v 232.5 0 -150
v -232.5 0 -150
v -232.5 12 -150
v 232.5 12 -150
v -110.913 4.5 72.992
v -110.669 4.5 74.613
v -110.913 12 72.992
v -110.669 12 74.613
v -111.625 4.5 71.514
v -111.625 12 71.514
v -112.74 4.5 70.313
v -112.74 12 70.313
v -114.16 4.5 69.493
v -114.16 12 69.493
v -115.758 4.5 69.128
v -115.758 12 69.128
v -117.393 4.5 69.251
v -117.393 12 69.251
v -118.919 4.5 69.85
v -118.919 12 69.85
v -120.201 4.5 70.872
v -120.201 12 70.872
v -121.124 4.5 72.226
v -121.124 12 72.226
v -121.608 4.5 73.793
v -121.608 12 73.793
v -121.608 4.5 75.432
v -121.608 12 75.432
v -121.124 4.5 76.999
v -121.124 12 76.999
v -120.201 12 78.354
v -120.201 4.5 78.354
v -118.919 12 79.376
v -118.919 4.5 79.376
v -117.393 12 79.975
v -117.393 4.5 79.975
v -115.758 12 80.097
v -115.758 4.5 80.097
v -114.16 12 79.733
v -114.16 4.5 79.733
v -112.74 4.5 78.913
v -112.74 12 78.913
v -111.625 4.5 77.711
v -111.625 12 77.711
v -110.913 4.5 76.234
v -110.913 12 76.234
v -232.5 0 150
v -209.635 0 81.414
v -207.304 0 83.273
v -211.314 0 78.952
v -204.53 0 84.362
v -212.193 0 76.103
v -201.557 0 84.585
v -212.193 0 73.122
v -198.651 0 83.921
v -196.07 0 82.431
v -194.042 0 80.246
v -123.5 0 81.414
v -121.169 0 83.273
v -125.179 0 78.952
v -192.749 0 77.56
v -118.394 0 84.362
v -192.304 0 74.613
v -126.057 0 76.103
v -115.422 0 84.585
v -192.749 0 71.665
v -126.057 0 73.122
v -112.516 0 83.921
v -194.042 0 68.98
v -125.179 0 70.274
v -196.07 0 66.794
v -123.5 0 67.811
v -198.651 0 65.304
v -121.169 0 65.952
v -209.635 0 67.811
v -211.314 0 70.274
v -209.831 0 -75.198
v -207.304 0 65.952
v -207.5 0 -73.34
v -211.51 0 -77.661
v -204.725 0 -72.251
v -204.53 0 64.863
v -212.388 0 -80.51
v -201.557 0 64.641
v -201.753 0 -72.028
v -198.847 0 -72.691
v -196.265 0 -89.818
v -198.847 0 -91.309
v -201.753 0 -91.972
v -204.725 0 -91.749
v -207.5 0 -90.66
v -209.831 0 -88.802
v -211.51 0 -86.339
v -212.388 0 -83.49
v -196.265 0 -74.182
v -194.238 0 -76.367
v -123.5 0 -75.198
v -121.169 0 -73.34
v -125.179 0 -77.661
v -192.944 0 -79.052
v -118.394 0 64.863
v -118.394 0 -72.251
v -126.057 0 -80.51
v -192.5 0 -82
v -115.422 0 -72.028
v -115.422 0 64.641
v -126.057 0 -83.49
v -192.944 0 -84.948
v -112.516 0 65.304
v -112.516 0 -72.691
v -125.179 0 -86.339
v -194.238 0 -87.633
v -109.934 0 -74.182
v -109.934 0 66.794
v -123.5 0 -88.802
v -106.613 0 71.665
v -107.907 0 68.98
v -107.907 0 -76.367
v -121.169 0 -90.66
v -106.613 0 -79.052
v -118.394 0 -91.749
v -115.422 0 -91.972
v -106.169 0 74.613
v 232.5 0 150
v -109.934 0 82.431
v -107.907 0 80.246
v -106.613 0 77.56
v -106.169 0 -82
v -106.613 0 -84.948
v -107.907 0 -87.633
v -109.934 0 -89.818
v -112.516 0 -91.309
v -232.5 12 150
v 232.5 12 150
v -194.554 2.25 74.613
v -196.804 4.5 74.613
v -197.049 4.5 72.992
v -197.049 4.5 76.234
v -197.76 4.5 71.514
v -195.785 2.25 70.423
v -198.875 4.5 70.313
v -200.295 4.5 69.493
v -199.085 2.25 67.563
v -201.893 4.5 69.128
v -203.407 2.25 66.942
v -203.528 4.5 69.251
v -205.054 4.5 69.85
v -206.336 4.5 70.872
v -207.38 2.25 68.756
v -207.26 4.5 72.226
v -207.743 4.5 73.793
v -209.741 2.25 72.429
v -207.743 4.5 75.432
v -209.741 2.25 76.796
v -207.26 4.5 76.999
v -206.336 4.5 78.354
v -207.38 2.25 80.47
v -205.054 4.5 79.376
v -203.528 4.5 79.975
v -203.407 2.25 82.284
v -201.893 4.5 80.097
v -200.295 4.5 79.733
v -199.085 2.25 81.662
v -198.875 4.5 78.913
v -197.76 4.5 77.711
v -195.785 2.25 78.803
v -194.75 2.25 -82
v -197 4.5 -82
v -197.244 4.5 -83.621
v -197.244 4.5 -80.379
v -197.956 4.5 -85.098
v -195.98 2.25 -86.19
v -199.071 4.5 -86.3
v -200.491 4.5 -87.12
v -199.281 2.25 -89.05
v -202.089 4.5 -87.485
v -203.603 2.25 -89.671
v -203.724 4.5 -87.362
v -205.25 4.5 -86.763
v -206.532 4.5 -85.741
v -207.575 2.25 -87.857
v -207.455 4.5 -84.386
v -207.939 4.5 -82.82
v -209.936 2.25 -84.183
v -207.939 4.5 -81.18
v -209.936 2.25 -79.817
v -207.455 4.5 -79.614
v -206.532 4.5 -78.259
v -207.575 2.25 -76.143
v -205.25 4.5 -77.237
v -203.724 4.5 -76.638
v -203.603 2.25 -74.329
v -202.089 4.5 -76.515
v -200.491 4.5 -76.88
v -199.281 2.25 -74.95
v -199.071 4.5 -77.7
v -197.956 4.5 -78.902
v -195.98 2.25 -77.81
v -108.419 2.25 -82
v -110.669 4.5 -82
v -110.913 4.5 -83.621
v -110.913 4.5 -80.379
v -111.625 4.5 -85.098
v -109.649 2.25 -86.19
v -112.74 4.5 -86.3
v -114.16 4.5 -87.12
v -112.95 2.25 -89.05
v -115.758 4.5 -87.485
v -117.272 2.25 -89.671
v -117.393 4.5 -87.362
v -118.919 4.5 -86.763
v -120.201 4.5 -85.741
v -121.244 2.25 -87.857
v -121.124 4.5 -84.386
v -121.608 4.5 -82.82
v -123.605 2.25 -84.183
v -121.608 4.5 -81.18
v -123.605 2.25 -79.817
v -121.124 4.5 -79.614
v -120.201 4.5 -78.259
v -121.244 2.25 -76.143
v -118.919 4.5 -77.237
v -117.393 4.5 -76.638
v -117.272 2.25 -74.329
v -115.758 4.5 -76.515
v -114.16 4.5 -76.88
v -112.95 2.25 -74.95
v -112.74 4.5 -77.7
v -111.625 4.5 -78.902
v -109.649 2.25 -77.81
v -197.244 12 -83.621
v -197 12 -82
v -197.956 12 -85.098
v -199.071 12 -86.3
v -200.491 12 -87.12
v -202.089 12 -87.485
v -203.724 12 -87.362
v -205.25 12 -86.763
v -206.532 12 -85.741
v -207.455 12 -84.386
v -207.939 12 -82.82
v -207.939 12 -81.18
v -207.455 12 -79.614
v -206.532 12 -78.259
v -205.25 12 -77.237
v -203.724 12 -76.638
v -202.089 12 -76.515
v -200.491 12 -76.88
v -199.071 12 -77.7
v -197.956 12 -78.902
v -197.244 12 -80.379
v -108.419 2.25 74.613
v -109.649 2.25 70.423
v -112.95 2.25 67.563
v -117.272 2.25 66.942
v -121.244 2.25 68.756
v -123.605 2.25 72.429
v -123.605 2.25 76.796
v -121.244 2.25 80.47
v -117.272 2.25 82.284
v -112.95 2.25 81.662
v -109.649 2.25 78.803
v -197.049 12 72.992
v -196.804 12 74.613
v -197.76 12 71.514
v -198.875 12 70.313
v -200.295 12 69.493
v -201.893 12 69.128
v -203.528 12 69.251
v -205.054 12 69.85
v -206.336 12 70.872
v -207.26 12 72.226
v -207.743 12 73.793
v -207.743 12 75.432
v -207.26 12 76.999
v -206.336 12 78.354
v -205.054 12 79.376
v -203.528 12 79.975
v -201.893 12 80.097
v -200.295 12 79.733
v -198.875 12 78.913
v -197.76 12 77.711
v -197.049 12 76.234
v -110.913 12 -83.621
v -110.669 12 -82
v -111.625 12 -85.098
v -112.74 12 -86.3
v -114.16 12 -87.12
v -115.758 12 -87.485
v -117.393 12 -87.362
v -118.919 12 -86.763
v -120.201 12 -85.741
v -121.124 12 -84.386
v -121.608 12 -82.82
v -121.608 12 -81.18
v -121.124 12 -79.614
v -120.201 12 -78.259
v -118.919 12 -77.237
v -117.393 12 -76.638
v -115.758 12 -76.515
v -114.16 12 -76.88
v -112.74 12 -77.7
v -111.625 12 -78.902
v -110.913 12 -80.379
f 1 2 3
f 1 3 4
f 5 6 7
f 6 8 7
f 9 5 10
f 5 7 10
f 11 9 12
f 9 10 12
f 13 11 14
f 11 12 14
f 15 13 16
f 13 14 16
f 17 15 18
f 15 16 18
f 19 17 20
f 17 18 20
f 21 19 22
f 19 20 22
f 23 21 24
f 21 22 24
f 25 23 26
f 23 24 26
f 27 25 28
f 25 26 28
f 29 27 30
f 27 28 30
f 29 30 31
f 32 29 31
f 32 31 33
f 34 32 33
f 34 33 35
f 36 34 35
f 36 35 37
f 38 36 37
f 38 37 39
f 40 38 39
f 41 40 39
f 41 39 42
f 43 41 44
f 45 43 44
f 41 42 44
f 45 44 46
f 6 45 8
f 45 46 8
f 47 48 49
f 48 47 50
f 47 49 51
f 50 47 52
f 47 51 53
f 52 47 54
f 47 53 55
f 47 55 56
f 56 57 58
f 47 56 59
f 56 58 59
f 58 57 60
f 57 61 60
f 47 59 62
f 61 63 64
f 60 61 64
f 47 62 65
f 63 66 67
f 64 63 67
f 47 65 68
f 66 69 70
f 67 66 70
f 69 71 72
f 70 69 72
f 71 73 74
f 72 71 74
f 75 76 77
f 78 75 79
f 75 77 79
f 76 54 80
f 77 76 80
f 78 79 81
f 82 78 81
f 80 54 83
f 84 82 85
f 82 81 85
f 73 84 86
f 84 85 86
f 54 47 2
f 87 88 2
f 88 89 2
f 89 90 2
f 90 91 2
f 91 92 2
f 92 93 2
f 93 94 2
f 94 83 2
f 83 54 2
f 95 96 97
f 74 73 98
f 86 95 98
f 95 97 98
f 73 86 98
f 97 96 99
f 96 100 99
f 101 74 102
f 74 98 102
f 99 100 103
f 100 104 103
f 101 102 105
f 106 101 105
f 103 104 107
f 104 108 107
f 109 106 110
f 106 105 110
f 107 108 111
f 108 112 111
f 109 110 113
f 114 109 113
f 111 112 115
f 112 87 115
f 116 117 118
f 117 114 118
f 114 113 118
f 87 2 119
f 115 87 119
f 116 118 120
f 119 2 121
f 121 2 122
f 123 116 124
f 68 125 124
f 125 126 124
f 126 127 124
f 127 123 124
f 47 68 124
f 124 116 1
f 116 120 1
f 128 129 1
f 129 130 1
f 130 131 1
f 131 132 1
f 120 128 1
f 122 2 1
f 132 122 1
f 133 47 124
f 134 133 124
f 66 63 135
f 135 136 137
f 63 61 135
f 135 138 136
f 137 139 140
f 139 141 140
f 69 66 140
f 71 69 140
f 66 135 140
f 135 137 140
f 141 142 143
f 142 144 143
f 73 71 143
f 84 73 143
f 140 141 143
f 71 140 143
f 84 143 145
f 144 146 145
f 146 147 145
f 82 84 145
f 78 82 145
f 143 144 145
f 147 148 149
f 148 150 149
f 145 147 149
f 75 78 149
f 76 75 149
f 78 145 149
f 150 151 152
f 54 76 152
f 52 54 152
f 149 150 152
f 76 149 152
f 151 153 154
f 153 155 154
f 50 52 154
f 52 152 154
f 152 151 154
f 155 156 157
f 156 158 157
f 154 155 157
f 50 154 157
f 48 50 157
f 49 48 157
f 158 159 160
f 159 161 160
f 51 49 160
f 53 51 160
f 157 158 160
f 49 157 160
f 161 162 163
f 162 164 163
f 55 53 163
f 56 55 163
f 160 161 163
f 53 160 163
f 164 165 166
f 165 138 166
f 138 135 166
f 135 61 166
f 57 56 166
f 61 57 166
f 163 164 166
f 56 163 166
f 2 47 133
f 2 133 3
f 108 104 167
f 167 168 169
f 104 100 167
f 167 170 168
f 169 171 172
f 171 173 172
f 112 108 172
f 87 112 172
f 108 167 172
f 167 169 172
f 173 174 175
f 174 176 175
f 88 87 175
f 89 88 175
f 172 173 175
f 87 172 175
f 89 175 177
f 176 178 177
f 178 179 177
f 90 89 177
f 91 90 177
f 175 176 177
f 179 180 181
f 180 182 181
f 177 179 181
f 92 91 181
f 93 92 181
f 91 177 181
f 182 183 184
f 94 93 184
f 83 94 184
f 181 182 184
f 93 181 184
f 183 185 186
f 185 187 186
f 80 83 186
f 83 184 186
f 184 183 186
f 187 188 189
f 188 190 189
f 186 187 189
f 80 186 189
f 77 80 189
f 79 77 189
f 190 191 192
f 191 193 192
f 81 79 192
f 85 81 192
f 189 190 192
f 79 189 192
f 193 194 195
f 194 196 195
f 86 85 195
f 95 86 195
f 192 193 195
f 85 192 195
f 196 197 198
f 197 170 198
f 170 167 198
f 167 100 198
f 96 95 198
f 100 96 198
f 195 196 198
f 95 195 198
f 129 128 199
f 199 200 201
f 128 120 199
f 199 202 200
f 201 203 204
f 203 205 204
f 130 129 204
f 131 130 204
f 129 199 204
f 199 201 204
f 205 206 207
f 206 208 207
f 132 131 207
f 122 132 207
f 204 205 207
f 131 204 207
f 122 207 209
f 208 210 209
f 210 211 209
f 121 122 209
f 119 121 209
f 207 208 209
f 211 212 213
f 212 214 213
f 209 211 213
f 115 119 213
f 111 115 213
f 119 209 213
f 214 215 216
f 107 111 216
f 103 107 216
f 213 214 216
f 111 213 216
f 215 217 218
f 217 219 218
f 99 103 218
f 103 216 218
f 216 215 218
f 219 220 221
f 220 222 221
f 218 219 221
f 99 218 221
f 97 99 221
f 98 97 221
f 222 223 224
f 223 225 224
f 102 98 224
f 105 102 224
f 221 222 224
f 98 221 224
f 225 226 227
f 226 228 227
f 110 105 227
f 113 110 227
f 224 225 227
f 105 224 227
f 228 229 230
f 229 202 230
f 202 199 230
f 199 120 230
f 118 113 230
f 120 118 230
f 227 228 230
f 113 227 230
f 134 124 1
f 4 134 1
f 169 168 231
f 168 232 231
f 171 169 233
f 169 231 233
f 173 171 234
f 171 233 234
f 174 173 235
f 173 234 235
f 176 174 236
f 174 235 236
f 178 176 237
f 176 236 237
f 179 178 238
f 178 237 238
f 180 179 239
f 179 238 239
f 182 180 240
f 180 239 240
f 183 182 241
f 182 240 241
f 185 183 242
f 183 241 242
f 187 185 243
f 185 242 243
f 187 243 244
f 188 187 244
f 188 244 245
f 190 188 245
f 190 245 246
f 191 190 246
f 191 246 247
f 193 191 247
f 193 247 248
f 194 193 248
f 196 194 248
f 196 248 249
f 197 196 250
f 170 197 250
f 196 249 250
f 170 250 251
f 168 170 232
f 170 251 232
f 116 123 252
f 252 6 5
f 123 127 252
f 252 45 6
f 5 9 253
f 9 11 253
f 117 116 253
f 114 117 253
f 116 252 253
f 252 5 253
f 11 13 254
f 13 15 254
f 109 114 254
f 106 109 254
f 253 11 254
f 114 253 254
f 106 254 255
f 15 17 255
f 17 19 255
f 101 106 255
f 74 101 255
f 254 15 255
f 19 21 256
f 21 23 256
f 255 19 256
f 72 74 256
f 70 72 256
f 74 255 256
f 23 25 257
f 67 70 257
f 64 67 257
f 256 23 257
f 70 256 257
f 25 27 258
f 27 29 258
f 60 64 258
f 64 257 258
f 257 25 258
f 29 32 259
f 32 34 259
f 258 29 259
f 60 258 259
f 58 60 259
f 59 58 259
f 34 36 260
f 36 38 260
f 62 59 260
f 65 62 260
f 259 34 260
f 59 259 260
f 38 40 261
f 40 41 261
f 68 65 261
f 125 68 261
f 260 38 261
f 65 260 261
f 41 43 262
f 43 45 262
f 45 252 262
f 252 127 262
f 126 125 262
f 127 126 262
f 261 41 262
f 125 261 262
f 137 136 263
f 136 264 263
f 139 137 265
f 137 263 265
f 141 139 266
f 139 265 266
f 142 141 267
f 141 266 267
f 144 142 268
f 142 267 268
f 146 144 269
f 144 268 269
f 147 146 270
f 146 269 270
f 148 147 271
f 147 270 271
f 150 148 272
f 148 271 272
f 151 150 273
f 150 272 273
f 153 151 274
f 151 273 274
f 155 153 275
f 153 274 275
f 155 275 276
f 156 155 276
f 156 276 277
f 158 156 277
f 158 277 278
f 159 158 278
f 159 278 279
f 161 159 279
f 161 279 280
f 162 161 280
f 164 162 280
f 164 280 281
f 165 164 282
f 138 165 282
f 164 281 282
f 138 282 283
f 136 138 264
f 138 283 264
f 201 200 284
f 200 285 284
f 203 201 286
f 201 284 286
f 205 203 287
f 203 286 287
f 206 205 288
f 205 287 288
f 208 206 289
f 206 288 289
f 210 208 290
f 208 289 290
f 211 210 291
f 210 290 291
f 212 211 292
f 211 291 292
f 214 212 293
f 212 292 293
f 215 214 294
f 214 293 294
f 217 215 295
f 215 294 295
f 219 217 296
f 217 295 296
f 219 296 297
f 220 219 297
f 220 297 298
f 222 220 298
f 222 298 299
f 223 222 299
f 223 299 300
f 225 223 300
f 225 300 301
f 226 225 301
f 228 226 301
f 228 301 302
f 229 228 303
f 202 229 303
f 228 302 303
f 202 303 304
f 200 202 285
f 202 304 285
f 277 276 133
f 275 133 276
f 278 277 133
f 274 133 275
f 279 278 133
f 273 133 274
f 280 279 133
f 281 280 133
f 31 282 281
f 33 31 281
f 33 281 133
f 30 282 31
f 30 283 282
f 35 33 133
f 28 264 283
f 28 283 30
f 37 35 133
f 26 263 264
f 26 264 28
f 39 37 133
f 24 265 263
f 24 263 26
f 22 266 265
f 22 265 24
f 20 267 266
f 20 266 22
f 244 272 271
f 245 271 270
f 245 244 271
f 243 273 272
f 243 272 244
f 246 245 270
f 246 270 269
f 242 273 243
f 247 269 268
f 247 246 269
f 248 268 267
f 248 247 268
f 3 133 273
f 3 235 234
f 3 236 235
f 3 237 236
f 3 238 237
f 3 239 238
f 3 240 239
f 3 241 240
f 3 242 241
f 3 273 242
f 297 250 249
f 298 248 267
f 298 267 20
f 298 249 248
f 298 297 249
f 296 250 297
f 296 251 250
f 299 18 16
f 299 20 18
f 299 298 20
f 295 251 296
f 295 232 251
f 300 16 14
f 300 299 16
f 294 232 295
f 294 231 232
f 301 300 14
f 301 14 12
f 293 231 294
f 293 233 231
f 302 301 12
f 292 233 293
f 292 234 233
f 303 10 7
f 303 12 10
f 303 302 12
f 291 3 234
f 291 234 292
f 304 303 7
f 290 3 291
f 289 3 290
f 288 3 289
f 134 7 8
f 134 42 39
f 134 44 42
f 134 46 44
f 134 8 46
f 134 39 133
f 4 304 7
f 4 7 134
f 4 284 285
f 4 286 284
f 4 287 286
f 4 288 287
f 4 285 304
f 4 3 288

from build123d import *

# Parameters (mm, degrees)
SKETCH1_W                                            = 465
SKETCH1_H                                            = 300
BOSS_EXTRUDE1_DEPTH                                  = 12
CSK_FOR_M10_COUNTERSUNK_FLAT_HEAD_SCREW1_D           = 11
CSK_FOR_M10_COUNTERSUNK_FLAT_HEAD_SCREW1_DEPTH       = 20.003
CSK_FOR_M10_COUNTERSUNK_FLAT_HEAD_SCREW1_CSINK_D     = 20
CSK_FOR_M10_COUNTERSUNK_FLAT_HEAD_SCREW1_CSINK_ANGLE = 90
CSK_FOR_M10_COUNTERSUNK_FLAT_HEAD_SCREW1_TIP         = 3.304733405


with BuildPart() as part:
    # Sketch1 → Boss-Extrude1 (new body)
    with BuildSketch(Plane(origin=(0, 0, 0), x_dir=(1, 0, 0), z_dir=(0, 1, 0))):
        Rectangle(SKETCH1_W, SKETCH1_H)
    extrude(amount=BOSS_EXTRUDE1_DEPTH)

    # CSK for M10 Countersunk Flat Head Screw1
    with Locations(Plane(origin=(0, 0, 0), x_dir=(-1, 0, 0), z_dir=(0, -1, 0))):
        with Locations((116.169058485, -74.612719009), (202.304435362, -74.612719009), (202.5, 82), (116.169058485, 82)):
            CounterSinkHole(CSK_FOR_M10_COUNTERSUNK_FLAT_HEAD_SCREW1_D / 2, CSK_FOR_M10_COUNTERSUNK_FLAT_HEAD_SCREW1_CSINK_D / 2, depth=CSK_FOR_M10_COUNTERSUNK_FLAT_HEAD_SCREW1_DEPTH, counter_sink_angle=CSK_FOR_M10_COUNTERSUNK_FLAT_HEAD_SCREW1_CSINK_ANGLE)
            with Locations((0, 0, -(CSK_FOR_M10_COUNTERSUNK_FLAT_HEAD_SCREW1_DEPTH + CSK_FOR_M10_COUNTERSUNK_FLAT_HEAD_SCREW1_TIP / 2))):  # 118° drill point
                Cone(0, CSK_FOR_M10_COUNTERSUNK_FLAT_HEAD_SCREW1_D / 2, CSK_FOR_M10_COUNTERSUNK_FLAT_HEAD_SCREW1_TIP, mode=Mode.SUBTRACT)


solid = part.part
